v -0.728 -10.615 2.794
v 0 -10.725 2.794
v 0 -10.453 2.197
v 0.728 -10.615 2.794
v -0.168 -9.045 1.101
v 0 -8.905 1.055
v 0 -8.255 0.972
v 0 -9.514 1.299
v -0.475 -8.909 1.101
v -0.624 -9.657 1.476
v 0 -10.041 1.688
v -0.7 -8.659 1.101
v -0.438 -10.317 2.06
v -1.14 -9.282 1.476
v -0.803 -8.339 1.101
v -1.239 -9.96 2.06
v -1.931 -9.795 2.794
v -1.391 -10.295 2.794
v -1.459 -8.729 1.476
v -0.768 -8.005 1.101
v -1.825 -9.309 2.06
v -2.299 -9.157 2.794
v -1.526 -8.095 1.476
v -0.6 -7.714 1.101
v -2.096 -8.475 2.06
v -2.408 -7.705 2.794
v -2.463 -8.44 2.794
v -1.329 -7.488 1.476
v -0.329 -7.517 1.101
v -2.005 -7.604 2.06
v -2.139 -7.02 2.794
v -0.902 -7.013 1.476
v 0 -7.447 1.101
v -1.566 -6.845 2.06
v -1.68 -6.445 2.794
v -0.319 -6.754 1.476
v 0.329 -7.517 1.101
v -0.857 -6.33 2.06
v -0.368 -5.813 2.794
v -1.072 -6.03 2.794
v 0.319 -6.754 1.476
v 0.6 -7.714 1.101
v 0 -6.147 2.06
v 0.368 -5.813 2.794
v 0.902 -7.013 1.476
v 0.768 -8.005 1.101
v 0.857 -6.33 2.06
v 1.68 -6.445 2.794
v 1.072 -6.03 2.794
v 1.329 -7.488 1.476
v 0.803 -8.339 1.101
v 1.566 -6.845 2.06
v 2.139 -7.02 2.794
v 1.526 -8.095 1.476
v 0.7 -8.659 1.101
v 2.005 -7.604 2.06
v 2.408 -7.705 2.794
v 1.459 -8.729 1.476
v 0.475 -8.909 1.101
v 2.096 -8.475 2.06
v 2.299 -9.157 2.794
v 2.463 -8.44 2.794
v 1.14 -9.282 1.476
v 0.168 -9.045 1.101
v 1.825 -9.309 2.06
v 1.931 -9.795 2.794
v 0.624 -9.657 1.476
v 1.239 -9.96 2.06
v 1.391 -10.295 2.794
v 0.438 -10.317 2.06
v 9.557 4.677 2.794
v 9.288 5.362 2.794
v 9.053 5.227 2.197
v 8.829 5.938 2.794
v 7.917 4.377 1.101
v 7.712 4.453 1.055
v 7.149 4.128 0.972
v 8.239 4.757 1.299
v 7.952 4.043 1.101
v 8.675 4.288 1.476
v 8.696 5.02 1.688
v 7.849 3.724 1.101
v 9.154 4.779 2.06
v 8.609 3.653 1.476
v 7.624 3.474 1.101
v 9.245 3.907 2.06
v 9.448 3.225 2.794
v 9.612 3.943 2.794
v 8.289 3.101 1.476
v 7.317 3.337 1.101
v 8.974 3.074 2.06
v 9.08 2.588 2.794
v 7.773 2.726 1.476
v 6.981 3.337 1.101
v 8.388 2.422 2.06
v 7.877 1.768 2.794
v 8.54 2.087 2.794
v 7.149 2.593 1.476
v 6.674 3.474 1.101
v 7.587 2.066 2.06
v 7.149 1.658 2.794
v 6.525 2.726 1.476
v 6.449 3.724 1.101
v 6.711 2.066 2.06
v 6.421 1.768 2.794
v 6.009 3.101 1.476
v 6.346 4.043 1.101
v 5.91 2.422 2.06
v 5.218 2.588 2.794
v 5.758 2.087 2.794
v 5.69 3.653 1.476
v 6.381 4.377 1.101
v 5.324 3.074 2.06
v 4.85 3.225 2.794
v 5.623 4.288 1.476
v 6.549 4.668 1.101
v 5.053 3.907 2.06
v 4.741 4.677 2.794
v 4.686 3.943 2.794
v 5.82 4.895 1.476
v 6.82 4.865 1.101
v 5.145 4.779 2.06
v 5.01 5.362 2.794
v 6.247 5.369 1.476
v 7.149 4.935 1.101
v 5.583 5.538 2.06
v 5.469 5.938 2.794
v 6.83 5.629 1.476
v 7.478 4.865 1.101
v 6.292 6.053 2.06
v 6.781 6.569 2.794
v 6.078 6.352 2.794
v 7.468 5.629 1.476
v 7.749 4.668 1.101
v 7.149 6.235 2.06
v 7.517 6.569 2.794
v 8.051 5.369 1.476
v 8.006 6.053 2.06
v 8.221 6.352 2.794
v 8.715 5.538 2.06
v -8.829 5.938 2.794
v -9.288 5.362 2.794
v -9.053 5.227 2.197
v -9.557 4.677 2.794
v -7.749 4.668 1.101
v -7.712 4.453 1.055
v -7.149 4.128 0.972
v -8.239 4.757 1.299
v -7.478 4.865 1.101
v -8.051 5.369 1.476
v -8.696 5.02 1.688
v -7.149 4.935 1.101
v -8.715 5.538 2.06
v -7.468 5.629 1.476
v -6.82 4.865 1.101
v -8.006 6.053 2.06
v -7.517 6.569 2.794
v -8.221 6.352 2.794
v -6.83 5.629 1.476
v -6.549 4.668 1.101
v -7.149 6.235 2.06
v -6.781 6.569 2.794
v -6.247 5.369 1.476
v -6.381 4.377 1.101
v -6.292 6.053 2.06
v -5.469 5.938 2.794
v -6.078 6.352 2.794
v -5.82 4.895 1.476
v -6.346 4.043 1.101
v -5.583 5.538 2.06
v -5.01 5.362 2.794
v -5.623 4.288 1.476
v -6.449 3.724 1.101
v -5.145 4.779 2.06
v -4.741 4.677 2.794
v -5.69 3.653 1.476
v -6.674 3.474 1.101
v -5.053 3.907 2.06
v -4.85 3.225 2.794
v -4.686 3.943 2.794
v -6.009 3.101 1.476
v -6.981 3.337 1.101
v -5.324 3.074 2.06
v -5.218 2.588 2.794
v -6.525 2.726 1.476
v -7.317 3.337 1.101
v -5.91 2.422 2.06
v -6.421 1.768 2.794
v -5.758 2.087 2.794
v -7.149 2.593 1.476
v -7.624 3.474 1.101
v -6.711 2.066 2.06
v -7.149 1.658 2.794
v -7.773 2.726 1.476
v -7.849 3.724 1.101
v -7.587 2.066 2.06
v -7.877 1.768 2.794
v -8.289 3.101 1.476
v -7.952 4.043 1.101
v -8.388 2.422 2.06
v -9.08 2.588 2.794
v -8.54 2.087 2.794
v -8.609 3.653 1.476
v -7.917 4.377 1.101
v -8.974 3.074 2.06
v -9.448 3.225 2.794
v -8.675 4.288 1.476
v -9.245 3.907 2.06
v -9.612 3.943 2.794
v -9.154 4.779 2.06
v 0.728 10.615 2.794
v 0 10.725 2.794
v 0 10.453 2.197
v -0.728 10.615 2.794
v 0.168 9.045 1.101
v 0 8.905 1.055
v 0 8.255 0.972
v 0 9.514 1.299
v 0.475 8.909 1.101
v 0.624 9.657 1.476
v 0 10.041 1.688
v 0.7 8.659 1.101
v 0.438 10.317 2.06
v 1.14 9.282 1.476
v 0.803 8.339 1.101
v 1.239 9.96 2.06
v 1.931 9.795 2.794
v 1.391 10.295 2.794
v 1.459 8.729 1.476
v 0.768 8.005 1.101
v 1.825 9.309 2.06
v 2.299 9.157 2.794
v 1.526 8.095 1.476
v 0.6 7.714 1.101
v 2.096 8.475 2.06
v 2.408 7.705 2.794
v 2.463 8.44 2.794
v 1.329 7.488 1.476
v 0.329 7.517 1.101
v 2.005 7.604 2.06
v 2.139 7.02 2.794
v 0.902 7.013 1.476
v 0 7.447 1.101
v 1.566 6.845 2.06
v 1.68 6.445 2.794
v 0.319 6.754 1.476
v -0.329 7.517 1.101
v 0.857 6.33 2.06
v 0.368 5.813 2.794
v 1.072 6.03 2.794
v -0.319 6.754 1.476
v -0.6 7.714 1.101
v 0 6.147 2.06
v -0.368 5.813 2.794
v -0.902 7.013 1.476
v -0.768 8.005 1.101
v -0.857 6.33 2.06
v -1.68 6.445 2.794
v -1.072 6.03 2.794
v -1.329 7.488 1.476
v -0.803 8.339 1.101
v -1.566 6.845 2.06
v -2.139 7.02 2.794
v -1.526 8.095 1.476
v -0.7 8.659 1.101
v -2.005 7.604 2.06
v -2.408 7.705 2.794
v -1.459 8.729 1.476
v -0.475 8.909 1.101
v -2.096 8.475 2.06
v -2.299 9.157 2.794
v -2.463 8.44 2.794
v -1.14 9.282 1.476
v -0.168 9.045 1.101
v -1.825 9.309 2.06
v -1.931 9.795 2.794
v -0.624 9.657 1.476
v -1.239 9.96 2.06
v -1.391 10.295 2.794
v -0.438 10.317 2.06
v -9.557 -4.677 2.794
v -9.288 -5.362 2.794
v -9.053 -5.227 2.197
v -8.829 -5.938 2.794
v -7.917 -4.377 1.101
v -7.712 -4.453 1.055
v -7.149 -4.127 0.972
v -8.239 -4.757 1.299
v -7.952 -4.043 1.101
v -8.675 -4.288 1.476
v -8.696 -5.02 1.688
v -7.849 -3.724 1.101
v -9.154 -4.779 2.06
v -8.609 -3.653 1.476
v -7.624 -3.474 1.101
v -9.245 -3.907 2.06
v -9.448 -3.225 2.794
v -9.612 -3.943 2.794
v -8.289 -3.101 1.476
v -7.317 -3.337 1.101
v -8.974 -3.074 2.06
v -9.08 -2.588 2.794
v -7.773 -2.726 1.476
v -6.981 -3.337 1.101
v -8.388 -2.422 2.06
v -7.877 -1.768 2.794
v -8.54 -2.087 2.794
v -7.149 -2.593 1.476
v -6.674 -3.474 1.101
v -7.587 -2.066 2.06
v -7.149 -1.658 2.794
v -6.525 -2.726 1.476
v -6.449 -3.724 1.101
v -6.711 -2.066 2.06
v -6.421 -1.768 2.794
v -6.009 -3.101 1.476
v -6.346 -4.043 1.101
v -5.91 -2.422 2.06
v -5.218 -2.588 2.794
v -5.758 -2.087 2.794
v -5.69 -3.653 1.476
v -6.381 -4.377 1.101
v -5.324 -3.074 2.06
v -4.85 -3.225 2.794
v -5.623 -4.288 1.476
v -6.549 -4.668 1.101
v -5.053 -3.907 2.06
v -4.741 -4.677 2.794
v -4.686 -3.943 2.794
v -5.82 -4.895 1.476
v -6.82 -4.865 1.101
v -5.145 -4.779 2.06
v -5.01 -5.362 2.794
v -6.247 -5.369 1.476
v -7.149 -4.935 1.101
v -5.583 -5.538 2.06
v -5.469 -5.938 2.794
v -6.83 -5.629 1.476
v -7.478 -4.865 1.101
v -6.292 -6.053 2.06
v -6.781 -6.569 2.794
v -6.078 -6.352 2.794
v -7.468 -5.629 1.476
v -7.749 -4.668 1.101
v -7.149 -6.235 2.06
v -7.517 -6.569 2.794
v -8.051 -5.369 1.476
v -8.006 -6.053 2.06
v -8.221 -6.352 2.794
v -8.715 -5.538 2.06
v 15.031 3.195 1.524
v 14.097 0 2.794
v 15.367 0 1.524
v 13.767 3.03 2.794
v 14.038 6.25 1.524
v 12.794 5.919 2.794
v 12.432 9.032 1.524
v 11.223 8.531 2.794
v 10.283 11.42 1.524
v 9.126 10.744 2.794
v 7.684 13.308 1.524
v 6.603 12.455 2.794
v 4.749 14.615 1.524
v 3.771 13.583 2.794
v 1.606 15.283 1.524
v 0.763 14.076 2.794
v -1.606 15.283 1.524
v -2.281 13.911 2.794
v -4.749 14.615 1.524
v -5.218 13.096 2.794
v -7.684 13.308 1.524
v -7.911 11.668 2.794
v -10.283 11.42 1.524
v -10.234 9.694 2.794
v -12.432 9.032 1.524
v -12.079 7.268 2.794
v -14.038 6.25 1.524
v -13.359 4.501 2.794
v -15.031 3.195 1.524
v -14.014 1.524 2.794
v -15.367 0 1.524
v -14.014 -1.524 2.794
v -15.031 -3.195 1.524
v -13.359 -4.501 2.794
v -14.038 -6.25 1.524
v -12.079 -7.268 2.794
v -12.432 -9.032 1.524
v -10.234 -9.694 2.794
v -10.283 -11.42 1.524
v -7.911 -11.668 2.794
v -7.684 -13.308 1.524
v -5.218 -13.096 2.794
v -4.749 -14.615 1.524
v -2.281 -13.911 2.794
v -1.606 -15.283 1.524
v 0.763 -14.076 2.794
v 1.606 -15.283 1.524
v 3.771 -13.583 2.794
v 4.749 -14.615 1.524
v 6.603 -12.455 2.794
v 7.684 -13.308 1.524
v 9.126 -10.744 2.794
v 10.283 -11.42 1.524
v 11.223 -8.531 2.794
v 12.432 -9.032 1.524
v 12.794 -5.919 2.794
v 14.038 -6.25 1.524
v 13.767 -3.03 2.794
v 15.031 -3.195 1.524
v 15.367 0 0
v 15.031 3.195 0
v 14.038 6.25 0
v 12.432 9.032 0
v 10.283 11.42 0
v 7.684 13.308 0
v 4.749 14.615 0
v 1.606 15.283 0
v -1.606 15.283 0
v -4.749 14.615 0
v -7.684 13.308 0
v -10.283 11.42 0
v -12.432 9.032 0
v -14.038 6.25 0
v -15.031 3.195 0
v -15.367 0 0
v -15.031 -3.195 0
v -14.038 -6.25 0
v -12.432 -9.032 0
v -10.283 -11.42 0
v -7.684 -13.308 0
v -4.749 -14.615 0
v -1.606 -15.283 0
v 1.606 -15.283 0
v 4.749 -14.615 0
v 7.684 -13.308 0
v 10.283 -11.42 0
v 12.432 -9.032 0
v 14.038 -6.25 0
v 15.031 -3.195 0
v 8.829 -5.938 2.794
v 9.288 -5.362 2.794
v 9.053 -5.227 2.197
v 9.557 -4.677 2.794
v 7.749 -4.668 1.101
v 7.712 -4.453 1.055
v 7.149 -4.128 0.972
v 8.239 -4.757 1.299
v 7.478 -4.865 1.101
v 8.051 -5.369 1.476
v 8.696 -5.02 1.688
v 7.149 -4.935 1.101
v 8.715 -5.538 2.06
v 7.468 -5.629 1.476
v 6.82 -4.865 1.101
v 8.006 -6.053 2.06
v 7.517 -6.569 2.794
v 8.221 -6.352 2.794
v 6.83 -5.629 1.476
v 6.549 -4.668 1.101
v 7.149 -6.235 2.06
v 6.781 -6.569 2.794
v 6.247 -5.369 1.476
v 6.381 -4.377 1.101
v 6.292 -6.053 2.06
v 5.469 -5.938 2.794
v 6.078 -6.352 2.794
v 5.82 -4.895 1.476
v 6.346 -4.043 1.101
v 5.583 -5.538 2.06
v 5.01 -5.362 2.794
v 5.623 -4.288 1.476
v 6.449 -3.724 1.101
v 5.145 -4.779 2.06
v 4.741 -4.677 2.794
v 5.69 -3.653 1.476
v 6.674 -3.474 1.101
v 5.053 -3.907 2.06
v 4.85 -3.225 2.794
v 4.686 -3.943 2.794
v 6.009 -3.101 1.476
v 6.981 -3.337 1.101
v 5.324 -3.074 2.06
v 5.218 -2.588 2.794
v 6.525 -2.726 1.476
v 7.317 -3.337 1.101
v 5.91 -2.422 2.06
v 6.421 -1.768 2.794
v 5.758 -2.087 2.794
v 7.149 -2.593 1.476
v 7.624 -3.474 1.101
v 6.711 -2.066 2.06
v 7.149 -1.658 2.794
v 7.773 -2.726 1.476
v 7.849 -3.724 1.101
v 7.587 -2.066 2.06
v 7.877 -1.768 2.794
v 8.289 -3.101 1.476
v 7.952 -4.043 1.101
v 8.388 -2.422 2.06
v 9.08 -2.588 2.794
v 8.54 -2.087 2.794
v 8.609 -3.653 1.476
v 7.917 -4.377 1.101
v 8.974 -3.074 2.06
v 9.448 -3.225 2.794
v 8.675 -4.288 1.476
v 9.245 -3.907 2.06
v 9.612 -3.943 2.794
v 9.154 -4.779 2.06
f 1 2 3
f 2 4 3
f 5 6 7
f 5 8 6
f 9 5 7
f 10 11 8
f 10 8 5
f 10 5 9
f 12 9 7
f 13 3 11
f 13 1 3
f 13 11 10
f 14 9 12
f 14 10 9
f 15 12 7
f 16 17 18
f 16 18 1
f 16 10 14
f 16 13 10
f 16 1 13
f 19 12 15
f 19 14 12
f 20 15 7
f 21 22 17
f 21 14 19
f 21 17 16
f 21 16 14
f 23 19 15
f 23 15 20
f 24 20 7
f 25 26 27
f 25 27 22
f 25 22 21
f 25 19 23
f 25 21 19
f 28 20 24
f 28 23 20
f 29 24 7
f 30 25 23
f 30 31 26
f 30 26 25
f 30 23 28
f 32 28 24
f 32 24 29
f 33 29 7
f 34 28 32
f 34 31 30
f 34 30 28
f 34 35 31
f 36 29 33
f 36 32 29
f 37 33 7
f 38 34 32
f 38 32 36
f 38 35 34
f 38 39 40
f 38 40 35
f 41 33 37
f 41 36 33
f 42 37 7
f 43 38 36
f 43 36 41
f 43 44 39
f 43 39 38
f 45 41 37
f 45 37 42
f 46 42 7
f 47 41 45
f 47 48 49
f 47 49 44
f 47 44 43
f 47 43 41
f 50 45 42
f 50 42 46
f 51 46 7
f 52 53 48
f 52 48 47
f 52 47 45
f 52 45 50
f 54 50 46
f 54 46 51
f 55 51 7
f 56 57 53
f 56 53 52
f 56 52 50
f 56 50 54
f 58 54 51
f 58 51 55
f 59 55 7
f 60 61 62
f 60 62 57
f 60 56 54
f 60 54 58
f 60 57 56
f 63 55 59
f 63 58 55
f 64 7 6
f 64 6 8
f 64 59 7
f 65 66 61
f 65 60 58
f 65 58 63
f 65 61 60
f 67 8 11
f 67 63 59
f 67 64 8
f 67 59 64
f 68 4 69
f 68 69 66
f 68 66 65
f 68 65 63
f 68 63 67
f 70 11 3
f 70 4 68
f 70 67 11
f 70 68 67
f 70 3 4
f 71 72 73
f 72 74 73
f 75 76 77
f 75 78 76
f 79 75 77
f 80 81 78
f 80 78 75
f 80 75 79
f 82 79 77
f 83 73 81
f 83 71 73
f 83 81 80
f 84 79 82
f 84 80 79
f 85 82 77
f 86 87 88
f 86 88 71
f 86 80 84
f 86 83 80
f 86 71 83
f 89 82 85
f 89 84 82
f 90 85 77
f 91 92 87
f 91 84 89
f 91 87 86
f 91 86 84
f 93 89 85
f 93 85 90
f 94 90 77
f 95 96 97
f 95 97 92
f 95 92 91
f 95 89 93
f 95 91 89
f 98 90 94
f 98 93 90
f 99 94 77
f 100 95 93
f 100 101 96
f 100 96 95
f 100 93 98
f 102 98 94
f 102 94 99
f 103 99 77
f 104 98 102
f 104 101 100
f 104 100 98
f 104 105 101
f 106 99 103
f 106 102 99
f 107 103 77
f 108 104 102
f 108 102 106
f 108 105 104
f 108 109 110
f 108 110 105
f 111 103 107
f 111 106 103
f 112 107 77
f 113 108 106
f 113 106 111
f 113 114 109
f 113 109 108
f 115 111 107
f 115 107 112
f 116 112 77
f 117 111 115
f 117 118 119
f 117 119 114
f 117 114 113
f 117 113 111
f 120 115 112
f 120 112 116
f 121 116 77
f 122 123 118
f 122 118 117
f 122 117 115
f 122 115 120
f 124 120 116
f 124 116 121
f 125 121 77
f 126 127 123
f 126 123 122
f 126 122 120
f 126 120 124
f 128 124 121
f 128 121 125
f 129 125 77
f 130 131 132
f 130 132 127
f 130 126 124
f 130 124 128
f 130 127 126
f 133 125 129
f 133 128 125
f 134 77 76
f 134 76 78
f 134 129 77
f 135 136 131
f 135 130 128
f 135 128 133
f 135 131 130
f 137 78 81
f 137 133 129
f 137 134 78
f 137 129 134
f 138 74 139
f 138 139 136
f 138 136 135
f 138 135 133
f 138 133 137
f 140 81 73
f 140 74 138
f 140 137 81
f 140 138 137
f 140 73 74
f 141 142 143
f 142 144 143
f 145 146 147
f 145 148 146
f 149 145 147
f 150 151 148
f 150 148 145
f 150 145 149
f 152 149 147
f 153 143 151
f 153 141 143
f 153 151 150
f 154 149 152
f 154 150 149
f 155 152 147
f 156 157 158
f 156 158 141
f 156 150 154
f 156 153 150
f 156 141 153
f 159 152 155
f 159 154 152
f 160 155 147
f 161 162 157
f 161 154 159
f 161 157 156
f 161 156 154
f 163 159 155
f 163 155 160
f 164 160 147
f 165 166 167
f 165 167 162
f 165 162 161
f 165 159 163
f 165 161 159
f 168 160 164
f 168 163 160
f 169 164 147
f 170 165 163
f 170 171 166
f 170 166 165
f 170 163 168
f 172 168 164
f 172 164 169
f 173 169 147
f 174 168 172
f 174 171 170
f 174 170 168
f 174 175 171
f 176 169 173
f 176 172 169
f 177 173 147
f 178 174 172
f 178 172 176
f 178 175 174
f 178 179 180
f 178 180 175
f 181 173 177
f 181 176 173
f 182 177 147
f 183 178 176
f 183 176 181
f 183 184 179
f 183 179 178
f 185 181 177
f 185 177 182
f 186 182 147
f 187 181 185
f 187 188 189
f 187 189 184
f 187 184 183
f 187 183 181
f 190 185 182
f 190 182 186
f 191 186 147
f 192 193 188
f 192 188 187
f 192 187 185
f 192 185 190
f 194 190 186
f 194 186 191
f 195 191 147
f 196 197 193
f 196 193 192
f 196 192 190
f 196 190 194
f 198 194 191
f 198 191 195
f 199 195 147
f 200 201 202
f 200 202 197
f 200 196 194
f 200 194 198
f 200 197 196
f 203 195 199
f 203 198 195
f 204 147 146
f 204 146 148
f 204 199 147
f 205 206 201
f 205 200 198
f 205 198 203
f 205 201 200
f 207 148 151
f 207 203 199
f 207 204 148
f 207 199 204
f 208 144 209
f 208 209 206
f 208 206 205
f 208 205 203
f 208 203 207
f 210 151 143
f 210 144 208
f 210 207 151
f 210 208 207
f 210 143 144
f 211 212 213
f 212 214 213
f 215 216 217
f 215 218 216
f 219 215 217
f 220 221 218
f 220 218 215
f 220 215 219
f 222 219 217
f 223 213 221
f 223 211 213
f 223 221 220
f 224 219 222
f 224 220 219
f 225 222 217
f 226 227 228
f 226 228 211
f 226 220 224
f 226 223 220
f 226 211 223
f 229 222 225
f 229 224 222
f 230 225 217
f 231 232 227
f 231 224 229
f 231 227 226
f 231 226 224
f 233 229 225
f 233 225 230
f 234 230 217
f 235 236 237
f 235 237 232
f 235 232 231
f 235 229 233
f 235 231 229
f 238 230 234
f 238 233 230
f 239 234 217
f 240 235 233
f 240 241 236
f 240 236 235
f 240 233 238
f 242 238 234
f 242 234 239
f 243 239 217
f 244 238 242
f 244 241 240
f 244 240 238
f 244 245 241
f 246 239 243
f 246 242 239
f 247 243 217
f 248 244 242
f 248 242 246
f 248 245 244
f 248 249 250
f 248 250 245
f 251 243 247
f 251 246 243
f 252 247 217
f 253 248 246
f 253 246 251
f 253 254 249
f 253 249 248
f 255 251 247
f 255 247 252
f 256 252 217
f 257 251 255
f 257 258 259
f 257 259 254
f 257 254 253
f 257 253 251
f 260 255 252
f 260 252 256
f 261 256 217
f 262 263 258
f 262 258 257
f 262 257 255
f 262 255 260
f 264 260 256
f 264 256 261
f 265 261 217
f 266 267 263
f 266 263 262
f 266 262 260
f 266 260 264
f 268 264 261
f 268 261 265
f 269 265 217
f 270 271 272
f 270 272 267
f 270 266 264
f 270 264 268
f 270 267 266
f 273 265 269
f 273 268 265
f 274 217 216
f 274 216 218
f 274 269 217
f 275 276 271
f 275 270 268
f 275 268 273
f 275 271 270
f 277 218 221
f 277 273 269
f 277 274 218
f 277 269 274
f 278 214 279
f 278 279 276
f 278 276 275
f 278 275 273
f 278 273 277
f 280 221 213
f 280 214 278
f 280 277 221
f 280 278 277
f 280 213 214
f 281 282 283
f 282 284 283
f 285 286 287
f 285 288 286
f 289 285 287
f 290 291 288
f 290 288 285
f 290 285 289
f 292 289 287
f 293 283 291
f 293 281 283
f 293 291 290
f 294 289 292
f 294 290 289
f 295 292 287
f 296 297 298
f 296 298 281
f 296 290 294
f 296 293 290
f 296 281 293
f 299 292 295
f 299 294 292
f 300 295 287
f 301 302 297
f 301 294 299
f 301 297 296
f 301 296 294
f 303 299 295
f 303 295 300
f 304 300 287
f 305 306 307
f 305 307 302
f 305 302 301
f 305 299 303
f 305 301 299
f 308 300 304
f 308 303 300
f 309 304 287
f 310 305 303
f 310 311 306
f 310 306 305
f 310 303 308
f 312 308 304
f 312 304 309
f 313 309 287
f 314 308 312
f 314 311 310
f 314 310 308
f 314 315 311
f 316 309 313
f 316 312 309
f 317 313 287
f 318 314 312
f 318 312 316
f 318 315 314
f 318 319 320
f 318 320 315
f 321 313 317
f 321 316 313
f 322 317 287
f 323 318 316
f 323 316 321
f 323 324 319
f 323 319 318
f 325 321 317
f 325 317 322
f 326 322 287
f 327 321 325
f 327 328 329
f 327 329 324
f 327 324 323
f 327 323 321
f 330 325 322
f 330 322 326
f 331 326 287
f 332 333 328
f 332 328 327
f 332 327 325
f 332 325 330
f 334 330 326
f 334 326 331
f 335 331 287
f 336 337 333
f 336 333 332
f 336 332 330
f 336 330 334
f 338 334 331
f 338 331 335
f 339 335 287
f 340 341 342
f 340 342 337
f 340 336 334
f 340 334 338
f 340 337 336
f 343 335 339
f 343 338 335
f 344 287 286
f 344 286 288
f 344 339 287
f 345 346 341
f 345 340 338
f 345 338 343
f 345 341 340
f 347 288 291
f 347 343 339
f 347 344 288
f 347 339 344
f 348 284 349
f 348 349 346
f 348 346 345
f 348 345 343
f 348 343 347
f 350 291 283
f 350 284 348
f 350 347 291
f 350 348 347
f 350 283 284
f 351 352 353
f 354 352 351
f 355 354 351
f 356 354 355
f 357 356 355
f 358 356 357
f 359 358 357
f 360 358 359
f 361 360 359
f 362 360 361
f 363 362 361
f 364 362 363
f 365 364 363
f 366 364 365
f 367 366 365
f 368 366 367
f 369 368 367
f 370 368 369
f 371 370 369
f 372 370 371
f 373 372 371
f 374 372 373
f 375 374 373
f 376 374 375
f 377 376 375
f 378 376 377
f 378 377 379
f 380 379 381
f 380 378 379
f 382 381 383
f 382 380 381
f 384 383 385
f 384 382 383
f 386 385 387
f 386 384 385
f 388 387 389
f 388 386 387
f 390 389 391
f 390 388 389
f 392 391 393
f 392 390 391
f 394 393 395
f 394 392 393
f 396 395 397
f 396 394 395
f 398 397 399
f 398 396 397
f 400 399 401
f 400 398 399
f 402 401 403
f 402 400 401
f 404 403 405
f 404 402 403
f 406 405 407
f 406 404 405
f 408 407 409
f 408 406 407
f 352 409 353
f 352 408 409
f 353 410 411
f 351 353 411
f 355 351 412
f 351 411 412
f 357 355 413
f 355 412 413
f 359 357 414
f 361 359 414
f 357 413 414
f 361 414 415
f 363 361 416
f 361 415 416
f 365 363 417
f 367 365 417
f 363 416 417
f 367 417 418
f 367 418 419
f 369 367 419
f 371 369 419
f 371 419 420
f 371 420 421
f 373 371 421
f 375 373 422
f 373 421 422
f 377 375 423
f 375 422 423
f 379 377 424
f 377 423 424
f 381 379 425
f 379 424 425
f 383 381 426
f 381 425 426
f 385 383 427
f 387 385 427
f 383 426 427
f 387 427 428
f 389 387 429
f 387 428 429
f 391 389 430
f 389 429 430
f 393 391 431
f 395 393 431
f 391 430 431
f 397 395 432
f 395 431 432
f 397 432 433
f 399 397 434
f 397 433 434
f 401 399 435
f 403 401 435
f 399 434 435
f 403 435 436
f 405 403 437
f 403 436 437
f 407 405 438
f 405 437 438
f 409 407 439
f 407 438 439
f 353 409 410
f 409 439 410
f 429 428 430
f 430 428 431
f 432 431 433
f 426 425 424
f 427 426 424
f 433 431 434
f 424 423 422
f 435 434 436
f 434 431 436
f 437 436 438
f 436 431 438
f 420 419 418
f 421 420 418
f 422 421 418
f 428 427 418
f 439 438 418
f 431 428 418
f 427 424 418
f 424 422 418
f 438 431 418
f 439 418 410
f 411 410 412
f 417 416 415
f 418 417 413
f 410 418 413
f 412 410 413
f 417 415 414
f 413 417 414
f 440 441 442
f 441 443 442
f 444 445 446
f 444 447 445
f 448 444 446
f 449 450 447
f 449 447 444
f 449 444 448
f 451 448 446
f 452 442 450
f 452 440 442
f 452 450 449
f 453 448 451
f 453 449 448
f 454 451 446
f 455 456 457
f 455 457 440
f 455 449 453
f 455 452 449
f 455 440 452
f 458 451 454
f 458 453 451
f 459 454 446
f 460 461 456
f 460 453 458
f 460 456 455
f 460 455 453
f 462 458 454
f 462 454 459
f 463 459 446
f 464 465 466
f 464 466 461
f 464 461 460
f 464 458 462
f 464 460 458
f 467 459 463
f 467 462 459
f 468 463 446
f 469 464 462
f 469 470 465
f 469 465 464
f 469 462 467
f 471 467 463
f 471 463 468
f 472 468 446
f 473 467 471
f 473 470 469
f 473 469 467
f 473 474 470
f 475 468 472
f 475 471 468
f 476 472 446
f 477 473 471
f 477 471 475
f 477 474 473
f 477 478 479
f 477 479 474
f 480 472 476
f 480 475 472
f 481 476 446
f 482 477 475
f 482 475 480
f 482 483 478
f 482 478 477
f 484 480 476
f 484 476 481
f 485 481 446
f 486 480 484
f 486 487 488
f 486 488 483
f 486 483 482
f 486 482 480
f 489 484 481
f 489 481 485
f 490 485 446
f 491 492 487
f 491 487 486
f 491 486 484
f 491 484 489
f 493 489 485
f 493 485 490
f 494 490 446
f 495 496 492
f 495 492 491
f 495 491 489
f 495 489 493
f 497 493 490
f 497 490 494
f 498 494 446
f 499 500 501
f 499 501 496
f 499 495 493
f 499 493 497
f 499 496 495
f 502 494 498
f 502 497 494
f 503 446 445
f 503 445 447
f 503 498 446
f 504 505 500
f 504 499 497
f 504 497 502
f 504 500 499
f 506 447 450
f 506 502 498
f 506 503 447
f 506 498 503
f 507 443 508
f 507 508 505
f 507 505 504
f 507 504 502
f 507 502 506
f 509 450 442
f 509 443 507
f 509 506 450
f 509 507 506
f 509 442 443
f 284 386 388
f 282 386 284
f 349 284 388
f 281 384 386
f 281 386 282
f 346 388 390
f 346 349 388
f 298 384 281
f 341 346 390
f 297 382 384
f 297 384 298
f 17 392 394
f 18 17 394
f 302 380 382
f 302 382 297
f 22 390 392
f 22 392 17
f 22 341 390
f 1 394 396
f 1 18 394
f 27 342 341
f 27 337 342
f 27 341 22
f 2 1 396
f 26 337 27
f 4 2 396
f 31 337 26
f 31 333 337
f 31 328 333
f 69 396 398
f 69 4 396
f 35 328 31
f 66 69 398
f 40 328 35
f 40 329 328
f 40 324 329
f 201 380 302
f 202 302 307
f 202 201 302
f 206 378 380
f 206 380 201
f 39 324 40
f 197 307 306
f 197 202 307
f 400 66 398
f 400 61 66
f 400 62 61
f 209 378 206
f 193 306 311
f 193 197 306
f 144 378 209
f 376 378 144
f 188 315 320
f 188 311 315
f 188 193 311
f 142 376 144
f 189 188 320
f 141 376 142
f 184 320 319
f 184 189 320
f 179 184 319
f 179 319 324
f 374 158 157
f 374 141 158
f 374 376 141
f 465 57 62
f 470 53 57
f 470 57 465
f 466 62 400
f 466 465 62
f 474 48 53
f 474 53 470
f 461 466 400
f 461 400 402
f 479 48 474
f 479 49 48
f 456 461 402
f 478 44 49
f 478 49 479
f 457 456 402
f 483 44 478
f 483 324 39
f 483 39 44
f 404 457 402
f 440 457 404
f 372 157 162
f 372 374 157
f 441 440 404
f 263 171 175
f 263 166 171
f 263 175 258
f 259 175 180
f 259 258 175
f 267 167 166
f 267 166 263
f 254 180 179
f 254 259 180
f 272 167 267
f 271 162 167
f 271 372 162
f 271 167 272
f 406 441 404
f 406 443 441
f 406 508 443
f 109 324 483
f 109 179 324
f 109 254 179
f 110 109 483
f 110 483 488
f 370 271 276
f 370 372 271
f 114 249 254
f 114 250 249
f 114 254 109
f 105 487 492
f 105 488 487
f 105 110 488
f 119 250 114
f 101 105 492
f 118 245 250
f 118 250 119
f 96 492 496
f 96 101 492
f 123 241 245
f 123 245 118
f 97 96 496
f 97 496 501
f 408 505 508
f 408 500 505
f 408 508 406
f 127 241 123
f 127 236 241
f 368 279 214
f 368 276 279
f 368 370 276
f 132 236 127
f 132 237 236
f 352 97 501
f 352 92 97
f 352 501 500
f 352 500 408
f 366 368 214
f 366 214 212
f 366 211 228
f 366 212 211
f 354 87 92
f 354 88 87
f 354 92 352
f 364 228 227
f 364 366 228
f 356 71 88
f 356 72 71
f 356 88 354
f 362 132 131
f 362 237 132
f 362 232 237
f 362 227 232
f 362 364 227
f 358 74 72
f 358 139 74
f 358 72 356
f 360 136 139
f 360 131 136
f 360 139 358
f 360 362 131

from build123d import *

# Parameters (mm, degrees)
SKETCH1_R           = 15.367
BOSS_EXTRUDE1_DEPTH = 2.794
CIRPATTERN1_COUNT   = 6
CHAMFER1_SIZE       = 1.27


with BuildPart() as part:
    # Sketch1 → Boss-Extrude1 (new body)
    with BuildSketch(Plane.XY):
        Circle(SKETCH1_R)
    extrude(amount=BOSS_EXTRUDE1_DEPTH)

    # Sketch3 → Cut-Revolve1 (revolve, cut)
    with BuildSketch(Plane(origin=(0, 0, 0), x_dir=(0, 0, -1), z_dir=(1, 0, 0))):
        with BuildLine():
            Line((-6.14045, 8.255), (-0.97155, 8.255))
            ThreePointArc((-0.97155, 8.255), (-3.556, 10.83945), (-6.14045, 8.255))
        make_face()
    cut_revolve1 = revolve(axis=Axis((0, 8.255, 6.14045), (0, 0, -1)), mode=Mode.SUBTRACT)

    # CirPattern1: Cut-Revolve1 ×6 about axis
    cirpattern1_axis = Axis((0, 0, 2.794), (0, 0, -1))
    for i in range(1, CIRPATTERN1_COUNT):
        add(cut_revolve1.rotate(cirpattern1_axis, i * 360 / CIRPATTERN1_COUNT), mode=Mode.SUBTRACT)

    # Chamfer1
    chamfer1_edges = [part.edges().sort_by_distance(p)[0] for p in [
        (-15.367, 0, 2.794),
    ]]
    chamfer(chamfer1_edges, length=CHAMFER1_SIZE)


solid = part.part
